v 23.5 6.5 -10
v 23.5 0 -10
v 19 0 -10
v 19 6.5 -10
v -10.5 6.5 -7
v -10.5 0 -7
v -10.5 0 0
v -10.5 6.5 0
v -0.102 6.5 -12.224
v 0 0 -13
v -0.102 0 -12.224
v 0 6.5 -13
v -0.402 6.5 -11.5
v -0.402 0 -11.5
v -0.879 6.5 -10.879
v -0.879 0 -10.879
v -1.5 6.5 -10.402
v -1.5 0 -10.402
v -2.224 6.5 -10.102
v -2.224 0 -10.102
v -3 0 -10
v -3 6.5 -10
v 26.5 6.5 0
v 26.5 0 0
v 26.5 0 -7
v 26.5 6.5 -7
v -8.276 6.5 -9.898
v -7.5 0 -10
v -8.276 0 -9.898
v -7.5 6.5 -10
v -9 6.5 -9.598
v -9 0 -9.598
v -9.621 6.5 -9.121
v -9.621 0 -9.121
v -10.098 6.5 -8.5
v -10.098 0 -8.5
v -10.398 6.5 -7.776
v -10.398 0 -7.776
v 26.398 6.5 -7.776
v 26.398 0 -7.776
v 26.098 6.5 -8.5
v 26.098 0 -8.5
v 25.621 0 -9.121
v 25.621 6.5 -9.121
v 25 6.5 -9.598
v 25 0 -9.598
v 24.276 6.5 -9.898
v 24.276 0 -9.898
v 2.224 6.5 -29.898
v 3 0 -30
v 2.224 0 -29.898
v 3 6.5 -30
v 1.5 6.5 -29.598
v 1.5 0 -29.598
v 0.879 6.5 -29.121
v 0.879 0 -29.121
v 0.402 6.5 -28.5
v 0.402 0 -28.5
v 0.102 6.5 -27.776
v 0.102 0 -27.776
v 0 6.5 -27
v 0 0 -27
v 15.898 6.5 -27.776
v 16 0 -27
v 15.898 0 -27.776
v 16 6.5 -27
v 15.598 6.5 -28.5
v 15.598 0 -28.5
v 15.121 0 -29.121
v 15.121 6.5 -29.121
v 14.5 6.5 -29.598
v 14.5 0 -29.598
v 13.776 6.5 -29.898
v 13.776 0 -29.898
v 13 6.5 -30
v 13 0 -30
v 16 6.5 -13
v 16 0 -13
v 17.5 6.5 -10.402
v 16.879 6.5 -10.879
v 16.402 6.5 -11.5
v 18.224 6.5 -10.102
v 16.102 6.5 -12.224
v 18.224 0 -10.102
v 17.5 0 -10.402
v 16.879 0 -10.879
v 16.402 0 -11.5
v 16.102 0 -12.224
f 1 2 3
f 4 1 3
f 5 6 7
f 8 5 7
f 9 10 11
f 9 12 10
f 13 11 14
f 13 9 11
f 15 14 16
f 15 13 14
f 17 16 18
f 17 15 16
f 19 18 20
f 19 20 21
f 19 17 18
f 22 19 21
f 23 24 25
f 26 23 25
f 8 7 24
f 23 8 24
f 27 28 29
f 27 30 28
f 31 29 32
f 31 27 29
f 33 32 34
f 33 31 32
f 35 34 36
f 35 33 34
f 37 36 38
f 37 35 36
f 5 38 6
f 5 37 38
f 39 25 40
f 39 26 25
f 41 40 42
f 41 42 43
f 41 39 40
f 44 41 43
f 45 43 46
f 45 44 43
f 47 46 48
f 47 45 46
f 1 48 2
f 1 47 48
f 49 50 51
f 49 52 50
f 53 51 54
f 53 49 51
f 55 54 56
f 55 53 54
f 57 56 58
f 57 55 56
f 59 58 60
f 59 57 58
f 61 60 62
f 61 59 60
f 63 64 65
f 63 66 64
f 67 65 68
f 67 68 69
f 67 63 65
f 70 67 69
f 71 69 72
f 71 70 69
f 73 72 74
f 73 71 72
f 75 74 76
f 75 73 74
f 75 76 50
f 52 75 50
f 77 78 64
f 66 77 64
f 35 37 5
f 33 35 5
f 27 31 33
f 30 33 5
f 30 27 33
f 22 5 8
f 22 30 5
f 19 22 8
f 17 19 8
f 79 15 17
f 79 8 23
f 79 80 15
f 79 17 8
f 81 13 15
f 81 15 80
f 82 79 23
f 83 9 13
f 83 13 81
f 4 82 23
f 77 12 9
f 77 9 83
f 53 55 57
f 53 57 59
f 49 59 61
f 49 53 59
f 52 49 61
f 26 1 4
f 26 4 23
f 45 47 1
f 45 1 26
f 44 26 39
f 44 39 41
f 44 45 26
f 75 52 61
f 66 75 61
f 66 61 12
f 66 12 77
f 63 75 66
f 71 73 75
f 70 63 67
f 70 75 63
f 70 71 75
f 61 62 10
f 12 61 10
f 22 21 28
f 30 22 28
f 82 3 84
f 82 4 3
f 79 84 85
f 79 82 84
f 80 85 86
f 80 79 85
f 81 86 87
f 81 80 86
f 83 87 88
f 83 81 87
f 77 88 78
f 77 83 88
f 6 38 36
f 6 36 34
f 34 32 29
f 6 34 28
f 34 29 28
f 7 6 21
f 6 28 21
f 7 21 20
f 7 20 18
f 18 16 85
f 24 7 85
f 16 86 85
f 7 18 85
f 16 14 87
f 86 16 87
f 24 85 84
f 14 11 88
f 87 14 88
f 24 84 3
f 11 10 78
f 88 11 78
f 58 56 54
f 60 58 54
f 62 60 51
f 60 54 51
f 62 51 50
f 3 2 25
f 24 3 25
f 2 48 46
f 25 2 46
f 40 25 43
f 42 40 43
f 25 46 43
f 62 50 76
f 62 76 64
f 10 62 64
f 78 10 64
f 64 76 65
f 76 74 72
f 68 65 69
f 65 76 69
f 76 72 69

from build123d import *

# Parameters (mm, degrees)
BOSS_EXTRUDE1_DEPTH = 6.5
FILLET1_R           = 3


with BuildPart() as part:
    # Sketch1 → Boss-Extrude1 (new body)
    with BuildSketch(Plane(origin=(0, 0, 0), x_dir=(1, 0, 0), z_dir=(0, 1, 0))):
        Polygon((0, 0), (16, 0), (26.5, 0), (26.5, 10), (16, 10), (16, 30), (0, 30), (0, 10), (-10.5, 10), (-10.5, 0), align=None)
    extrude(amount=BOSS_EXTRUDE1_DEPTH)

    # Fillet1
    fillet1_edges = [part.edges().sort_by_distance(p)[0] for p in [
        (0, 3.25, -10),
        (0, 3.25, -30),
        (16, 3.25, -30),
        (16, 3.25, -10),
        (26.5, 3.25, -10),
        (-10.5, 3.25, -10),
    ]]
    fillet(fillet1_edges, radius=FILLET1_R)


solid = part.part
